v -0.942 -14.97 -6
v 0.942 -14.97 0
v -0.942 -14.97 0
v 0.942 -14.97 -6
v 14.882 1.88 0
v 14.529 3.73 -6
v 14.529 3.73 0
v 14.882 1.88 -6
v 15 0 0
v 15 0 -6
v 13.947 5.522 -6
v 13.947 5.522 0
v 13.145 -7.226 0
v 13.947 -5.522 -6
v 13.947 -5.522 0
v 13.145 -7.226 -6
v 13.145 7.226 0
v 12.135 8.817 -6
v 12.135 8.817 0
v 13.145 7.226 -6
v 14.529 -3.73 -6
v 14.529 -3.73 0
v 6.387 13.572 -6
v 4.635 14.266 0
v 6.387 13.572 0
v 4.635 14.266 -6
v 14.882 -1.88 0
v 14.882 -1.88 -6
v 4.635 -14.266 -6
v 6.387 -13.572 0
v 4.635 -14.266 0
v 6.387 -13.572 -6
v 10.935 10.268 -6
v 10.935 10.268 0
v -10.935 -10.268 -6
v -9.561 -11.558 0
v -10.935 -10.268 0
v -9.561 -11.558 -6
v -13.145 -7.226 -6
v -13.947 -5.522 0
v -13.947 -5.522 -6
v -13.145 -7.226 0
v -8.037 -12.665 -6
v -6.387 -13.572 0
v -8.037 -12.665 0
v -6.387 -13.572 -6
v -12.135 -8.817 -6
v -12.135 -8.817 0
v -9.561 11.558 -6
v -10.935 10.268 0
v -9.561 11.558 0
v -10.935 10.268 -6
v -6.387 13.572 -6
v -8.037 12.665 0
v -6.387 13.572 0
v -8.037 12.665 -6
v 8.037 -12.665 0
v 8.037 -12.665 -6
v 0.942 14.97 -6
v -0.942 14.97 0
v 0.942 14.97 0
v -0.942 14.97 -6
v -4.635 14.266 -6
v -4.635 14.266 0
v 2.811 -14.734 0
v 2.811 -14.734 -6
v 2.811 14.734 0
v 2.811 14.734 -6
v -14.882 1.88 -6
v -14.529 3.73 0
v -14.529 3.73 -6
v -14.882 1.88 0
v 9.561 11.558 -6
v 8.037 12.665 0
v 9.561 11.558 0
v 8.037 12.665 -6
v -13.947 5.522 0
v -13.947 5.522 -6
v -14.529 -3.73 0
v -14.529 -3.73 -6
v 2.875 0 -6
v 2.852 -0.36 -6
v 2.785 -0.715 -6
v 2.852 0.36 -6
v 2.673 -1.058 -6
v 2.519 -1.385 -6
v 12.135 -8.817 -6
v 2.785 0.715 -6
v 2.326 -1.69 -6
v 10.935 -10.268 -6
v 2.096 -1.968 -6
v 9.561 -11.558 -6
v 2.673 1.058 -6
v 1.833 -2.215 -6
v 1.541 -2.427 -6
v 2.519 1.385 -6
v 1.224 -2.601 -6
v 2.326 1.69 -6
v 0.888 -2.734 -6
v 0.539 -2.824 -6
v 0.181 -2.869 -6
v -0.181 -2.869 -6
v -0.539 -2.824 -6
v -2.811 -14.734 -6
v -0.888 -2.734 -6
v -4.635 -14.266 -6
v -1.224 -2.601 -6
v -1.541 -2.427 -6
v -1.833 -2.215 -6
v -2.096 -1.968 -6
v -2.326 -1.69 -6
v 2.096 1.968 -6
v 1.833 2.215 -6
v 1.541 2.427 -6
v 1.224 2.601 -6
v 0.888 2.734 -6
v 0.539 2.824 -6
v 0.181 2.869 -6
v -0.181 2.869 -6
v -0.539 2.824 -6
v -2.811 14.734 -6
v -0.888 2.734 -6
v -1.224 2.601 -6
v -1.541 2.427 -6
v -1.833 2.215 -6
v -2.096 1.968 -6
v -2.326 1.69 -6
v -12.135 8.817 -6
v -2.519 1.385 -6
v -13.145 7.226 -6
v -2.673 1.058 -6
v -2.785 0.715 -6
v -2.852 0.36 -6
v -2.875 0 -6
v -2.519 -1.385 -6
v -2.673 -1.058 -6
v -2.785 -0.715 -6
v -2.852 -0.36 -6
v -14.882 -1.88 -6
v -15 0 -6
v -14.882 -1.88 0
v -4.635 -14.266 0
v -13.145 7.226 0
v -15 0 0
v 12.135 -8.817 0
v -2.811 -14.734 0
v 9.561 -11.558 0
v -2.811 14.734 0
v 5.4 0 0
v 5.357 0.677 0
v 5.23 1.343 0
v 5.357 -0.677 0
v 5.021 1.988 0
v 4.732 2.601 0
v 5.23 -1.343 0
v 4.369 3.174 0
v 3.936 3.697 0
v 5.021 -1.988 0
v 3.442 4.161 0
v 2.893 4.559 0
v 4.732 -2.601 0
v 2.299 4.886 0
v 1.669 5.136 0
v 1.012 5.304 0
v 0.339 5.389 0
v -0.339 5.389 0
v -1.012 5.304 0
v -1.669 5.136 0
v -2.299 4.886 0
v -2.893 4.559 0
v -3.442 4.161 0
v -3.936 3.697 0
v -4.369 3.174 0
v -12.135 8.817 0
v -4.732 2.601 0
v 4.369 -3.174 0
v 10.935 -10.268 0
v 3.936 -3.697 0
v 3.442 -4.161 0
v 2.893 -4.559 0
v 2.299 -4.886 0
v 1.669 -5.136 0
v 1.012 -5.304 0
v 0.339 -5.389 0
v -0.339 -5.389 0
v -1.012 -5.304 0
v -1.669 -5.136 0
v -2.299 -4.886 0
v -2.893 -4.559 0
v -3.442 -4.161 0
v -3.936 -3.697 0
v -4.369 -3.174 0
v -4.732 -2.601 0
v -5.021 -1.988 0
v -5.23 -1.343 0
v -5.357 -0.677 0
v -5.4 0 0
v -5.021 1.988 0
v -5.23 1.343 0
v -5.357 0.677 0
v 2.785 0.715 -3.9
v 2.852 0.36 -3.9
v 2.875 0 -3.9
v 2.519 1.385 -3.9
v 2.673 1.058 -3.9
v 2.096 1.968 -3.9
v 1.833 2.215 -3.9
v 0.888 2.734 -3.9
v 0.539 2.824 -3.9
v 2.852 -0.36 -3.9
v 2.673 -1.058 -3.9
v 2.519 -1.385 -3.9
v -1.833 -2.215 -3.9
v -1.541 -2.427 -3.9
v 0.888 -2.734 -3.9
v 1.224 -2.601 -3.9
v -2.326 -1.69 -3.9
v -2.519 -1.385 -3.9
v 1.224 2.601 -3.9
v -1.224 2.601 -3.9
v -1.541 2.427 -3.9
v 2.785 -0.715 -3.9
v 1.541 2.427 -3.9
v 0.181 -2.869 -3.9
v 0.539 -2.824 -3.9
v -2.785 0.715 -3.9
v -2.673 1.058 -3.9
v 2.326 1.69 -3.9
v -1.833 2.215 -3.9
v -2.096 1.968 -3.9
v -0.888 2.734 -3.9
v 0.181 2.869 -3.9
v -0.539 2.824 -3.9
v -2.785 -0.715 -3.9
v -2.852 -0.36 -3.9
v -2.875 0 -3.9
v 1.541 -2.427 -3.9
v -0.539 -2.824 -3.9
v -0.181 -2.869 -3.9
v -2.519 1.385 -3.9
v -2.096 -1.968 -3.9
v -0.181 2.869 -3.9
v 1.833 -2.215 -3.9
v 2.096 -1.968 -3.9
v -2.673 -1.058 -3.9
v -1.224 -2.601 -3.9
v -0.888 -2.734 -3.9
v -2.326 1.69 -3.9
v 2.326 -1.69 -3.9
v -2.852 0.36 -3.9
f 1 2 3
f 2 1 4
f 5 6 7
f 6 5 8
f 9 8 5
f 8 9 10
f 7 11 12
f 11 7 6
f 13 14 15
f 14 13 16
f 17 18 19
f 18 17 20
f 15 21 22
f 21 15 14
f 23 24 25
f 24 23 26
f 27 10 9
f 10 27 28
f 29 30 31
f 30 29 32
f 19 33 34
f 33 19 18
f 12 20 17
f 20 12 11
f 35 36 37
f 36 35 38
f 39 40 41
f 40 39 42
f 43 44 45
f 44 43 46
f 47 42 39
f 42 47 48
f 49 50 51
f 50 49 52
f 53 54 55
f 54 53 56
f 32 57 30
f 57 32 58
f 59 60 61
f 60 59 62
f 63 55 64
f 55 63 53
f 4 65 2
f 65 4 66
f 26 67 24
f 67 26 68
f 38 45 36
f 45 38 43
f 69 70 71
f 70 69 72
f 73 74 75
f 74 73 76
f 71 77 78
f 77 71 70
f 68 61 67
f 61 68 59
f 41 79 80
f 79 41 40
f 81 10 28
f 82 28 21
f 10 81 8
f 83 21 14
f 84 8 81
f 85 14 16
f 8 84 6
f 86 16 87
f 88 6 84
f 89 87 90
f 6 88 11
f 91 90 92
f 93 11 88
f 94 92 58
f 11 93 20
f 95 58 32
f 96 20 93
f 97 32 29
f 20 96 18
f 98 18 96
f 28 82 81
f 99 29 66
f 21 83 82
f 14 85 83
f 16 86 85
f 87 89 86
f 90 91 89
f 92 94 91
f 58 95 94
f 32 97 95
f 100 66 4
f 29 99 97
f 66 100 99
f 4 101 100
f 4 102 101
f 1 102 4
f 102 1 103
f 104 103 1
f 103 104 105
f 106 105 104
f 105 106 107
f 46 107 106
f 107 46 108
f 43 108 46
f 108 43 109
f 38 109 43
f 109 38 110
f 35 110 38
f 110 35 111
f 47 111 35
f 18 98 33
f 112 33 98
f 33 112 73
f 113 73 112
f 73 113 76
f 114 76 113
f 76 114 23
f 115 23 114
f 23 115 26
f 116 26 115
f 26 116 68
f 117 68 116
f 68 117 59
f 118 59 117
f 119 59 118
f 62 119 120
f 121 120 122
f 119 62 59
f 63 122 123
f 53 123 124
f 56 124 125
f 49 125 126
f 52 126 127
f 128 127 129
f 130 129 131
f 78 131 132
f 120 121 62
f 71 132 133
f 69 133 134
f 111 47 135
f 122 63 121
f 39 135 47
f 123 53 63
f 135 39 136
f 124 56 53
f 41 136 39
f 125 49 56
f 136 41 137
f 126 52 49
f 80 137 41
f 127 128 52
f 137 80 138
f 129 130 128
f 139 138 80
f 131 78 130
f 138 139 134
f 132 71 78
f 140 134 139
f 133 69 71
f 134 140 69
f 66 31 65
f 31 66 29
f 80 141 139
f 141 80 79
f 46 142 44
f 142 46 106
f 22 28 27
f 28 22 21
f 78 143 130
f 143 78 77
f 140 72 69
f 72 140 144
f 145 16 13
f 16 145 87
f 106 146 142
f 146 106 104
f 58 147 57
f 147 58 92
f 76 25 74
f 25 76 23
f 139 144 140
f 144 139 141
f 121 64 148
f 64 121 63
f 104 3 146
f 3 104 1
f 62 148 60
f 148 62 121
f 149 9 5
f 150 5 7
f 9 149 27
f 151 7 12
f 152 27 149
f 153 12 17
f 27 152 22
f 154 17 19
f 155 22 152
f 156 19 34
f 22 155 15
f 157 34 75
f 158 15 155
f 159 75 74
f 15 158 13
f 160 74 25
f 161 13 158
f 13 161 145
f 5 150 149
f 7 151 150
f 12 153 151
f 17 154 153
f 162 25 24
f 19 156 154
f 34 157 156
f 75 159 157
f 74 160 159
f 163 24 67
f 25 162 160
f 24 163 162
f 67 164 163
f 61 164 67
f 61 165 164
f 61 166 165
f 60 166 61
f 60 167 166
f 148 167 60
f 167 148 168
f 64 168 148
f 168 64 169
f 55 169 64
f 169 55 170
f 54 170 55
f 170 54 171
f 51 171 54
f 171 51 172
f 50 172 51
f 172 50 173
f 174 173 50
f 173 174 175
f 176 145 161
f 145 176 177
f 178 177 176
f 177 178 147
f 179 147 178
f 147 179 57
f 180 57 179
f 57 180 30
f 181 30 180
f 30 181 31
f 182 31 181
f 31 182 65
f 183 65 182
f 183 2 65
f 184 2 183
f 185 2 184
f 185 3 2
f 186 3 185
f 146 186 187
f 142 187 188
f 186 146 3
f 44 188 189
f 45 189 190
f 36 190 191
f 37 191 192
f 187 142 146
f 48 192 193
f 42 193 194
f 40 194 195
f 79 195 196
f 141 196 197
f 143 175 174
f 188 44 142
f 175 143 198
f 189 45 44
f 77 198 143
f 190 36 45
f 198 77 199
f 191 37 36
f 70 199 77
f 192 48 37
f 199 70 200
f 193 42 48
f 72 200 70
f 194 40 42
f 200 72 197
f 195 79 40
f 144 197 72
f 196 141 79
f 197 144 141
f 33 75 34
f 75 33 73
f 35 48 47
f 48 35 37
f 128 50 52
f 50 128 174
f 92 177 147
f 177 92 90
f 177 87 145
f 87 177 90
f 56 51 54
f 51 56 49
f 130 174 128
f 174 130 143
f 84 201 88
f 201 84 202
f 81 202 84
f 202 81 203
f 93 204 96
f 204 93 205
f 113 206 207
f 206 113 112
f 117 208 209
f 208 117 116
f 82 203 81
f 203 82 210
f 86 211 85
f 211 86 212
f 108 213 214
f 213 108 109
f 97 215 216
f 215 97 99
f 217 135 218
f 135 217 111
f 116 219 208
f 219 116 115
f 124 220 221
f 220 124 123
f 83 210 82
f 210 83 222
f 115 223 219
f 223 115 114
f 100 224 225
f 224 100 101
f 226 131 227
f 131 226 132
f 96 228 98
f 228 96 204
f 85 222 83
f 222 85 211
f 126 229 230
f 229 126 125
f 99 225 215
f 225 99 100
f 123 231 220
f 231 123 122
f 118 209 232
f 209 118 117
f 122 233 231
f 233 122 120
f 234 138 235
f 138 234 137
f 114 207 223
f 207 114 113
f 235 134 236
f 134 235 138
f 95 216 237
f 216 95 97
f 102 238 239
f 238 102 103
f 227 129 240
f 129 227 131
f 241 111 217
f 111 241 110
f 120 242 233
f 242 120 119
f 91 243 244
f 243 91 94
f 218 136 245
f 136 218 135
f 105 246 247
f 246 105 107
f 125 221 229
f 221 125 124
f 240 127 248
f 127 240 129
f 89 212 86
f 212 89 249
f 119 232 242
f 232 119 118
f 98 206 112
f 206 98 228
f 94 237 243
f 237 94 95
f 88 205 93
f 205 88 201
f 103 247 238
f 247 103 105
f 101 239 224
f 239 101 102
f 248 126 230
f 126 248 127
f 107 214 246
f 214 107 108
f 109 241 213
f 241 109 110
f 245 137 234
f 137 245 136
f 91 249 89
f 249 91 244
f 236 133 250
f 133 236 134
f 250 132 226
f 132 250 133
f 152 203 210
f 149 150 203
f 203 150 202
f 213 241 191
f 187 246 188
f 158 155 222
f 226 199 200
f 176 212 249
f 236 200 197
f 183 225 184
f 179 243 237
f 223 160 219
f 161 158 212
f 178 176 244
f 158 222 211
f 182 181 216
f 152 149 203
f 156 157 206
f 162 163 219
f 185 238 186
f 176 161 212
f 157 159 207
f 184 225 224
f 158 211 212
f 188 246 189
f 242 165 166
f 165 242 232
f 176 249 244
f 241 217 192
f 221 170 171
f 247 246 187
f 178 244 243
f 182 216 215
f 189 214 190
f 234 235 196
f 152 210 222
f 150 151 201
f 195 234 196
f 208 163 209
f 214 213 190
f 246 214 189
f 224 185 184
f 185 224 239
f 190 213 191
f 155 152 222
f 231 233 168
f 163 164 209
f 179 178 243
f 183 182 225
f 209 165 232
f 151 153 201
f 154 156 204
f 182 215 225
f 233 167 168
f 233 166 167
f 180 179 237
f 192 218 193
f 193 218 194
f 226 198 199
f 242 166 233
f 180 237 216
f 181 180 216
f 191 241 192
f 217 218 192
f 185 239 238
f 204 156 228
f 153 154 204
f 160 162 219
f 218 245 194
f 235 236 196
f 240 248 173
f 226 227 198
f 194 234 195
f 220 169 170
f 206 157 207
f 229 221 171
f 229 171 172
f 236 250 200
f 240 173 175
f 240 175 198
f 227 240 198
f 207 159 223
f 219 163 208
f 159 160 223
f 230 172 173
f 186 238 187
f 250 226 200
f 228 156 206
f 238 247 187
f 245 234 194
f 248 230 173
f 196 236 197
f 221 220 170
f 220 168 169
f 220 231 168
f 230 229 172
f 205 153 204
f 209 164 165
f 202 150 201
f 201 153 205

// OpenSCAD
$fn = 50;

difference() {
	union() {
		translate(v = [0, 0, -6.0]) {
			cylinder(h = 6, r = 15.0);
		}
		#translate(v = [0, 0, -9.0]) {
			cylinder(h = 9, r = 2.875);
		}
	}
	union() {
		translate(v = [0, 0, 0]) {
			rotate(a = [0, 0, 0]) {
				difference() {
					union() {
						translate(v = [0, 0, -9.0]) {
							cylinder(h = 9, r = 2.6);
						}
						translate(v = [0, 0, -3.9]) {
							cylinder(h = 3.9, r1 = 2.875, r2 = 5.4);
						}
						translate(v = [0, 0, -9.0]) {
							cylinder(h = 9, r = 2.875);
						}
						translate(v = [0, 0, -9.0]) {
							cylinder(h = 9, r = 2.6);
						}
					}
					union();
				}
			}
		}
	}
}
